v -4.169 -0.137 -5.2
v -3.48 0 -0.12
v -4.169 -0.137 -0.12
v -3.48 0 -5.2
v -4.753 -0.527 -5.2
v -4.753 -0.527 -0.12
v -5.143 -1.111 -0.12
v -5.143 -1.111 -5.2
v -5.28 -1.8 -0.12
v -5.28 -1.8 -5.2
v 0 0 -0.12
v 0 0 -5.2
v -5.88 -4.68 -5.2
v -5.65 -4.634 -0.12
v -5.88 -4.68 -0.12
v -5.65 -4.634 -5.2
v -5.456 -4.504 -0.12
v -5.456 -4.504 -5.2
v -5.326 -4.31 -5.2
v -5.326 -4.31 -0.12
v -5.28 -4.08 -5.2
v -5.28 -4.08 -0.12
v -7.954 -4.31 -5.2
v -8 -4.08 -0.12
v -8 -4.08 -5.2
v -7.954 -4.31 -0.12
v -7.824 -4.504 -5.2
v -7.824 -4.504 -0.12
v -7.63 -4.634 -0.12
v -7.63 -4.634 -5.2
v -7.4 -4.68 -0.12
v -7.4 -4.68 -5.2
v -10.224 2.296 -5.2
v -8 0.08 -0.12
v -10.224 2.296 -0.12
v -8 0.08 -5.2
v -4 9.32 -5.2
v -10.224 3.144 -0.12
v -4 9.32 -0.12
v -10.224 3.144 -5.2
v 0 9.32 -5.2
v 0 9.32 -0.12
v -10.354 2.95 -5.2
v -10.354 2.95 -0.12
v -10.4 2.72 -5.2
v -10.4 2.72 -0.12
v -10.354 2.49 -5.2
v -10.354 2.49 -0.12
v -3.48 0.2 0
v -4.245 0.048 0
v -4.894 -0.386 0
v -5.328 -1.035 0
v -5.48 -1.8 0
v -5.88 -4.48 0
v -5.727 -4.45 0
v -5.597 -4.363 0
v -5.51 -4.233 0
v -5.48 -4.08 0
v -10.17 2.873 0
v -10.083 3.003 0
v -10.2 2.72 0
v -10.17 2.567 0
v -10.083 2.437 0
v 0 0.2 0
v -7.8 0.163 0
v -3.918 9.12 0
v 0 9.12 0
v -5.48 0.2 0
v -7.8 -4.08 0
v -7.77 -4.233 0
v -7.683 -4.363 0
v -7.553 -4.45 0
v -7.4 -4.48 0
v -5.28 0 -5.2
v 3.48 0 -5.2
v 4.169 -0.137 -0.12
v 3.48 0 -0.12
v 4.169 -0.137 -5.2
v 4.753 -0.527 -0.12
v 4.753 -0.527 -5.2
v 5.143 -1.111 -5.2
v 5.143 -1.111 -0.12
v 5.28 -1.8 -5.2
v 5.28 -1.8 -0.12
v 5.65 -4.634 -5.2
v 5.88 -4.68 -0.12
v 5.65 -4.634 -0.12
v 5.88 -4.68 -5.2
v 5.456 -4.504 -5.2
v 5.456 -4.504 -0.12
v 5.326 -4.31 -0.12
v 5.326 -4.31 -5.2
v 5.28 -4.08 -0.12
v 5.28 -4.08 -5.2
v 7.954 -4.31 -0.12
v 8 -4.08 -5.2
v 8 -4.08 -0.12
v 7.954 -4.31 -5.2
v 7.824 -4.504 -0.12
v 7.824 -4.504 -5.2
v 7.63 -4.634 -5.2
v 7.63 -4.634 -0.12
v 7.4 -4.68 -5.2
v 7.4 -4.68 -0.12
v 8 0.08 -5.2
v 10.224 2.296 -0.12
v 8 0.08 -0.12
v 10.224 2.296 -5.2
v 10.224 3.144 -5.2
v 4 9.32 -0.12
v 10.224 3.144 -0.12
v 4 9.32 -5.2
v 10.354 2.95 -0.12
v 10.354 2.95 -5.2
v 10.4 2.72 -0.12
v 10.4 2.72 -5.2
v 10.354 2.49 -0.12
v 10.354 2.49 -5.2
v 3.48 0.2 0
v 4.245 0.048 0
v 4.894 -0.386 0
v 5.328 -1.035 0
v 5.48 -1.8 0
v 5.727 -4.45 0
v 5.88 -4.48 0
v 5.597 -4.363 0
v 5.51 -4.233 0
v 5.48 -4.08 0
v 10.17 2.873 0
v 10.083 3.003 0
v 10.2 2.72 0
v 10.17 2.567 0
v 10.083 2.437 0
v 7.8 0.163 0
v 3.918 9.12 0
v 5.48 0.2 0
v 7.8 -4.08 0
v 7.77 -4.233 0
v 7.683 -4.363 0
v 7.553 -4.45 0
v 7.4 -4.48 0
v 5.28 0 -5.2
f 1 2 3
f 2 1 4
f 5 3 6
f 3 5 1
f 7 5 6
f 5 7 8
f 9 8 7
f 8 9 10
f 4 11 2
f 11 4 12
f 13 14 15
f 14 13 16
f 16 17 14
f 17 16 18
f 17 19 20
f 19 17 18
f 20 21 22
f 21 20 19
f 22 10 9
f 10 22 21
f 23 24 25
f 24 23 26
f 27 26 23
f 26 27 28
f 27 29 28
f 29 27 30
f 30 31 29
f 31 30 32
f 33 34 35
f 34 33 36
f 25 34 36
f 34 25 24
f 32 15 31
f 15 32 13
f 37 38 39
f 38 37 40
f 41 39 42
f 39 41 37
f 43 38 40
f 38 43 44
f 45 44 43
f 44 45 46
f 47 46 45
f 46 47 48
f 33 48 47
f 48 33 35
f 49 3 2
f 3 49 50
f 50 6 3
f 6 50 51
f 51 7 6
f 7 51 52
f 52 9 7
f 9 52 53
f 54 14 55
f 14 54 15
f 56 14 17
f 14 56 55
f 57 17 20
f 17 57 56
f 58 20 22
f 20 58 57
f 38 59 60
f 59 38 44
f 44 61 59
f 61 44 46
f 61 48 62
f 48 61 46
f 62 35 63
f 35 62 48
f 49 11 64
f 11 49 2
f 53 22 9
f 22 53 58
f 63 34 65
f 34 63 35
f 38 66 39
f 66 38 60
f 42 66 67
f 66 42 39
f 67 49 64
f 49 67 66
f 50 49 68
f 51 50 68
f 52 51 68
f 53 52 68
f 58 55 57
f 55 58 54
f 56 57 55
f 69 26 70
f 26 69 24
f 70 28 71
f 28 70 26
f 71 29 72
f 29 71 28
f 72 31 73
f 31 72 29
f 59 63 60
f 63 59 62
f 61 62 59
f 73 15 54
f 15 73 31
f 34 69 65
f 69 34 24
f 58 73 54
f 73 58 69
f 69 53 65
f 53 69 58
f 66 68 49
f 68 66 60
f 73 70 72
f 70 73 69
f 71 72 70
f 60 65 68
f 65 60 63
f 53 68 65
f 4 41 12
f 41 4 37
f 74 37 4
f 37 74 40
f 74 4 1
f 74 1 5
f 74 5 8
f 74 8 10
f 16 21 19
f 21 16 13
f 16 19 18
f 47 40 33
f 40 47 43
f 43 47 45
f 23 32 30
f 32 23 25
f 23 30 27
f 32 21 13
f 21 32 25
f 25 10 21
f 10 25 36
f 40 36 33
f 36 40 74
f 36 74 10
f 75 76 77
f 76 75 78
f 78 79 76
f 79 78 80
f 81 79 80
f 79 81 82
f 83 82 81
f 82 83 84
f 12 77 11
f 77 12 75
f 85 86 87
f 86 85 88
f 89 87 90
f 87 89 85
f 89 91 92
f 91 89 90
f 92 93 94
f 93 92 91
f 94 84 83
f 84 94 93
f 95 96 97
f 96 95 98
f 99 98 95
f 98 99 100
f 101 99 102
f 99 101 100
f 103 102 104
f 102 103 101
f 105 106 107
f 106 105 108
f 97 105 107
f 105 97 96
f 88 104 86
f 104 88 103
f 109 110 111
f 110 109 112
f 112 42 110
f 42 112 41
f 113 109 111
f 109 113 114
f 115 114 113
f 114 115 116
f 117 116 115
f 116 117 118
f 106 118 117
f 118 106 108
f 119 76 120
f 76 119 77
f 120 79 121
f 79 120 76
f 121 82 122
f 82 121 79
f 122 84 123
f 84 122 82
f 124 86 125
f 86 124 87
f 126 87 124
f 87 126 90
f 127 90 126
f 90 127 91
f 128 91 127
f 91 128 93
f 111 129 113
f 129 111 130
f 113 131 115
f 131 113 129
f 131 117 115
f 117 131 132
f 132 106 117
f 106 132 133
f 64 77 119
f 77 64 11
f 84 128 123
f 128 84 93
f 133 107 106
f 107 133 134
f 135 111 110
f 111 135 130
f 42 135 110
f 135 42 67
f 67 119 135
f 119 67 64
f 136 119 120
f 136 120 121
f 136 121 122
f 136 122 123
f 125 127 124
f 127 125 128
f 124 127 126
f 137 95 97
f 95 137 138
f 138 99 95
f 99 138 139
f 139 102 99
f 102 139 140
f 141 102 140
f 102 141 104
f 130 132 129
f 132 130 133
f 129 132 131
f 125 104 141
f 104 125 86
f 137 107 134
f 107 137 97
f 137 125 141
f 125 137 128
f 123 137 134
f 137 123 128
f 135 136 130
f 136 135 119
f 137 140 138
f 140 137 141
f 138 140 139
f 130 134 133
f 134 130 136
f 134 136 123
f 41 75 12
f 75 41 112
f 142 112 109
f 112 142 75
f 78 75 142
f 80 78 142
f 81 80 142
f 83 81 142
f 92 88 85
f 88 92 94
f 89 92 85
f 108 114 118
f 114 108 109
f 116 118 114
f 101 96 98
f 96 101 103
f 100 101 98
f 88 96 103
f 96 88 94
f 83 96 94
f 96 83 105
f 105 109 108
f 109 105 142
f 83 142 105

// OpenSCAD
// file: ../p/1-4cyli.scad
use <../lib.scad>
function ldraw_lib__1_4cyli() = [
// 0 Cylinder 0.25
// 0 Name: 1-4cyli.dat
// 0 Author: James Jessiman
// 0 !LDRAW_ORG Primitive UPDATE 2012-01
// 0 !LICENSE Licensed under CC BY 2.0 and CC BY 4.0 : see CAreadme.txt
// 
// 0 BFC CERTIFY CCW
  [0,"BFC","CERTIFY"],
  [0,"BFC","CCW"],
// 
// 0 !HISTORY 2002-03-23 [sbliss] Added BFC statement.
// 0 !HISTORY 2002-04-25 [PTadmin] Official Update 2002-02
// 0 !HISTORY 2007-06-22 [PTadmin] Header formatted for Contributor Agreement
// 0 !HISTORY 2008-07-01 [PTadmin] Official Update 2008-01
// 0 !HISTORY 2012-02-16 [Philo] Changed to CCW
// 0 !HISTORY 2012-03-30 [PTadmin] Official Update 2012-01
// 
// 
// 4 16 1 1 0 0.9239 1 0.3827 0.9239 0 0.3827 1 0 0
  [4,16,1,1,0,0.9239,1,0.3827,0.9239,0,0.3827,1,0,0],
// 5 24 1 0 0 1 1 0 0.9239 0 0.3827 1 0 -1
  [5,24,1,0,0,1,1,0,0.9239,0,0.3827,1,0,-1],
// 4 16 0.9239 1 0.3827 0.7071 1 0.7071 0.7071 0 0.7071 0.9239 0 0.3827
  [4,16,0.9239,1,0.3827,0.7071,1,0.7071,0.7071,0,0.7071,0.9239,0,0.3827],
// 5 24 0.9239 0 0.3827 0.9239 1 0.3827 0.7071 0 0.7071 1 0 0
  [5,24,0.9239,0,0.3827,0.9239,1,0.3827,0.7071,0,0.7071,1,0,0],
// 4 16 0.7071 1 0.7071 0.3827 1 0.9239 0.3827 0 0.9239 0.7071 0 0.7071
  [4,16,0.7071,1,0.7071,0.3827,1,0.9239,0.3827,0,0.9239,0.7071,0,0.7071],
// 5 24 0.7071 0 0.7071 0.7071 1 0.7071 0.3827 0 0.9239 0.9239 0 0.3827
  [5,24,0.7071,0,0.7071,0.7071,1,0.7071,0.3827,0,0.9239,0.9239,0,0.3827],
// 4 16 0.3827 1 0.9239 0 1 1 0 0 1 0.3827 0 0.9239
  [4,16,0.3827,1,0.9239,0,1,1,0,0,1,0.3827,0,0.9239],
// 5 24 0.3827 0 0.9239 0.3827 1 0.9239 0 0 1 0.7071 0 0.7071
  [5,24,0.3827,0,0.9239,0.3827,1,0.9239,0,0,1,0.7071,0,0.7071],
// 5 24 0 0 1 0 1 1 0.3827 0 0.9239 -1 0 1
  [5,24,0,0,1,0,1,1,0.3827,0,0.9239,-1,0,1],
];
makepoly(ldraw_lib__1_4cyli(), line=0.2);
// file: ../p/rect3.scad
use <../lib.scad>
function ldraw_lib__rect3() = [
// 0 Rectangle with 3 Edges
// 0 Name: rect3.dat
// 0 Author: Mark Kennedy [mkennedy]
// 0 !LDRAW_ORG Primitive UPDATE 2010-01
// 0 !LICENSE Licensed under CC BY 2.0 and CC BY 4.0 : see CAreadme.txt
// 
// 0 BFC CERTIFY CCW
  [0,"BFC","CERTIFY"],
  [0,"BFC","CCW"],
// 
// 0 !HISTORY 2003-08-01 [PTadmin] Official Update 2003-02
// 0 !HISTORY 2007-06-24 [PTadmin] Header formatted for Contributor Agreement
// 0 !HISTORY 2008-07-01 [PTadmin] Official Update 2008-01
// 0 !HISTORY 2010-01-17 [mikeheide] Change winding to CCW
// 0 !HISTORY 2010-04-05 [PTadmin] Official Update 2010-01
// 
// 
// 2 24 1 0 1 -1 0 1
  [2,24,1,0,1,-1,0,1],
// 2 24 1 0 1 1 0 -1
  [2,24,1,0,1,1,0,-1],
// 2 24 -1 0 1 -1 0 -1
  [2,24,-1,0,1,-1,0,-1],
// 4 16 -1 0 1 -1 0 -1 1 0 -1 1 0 1
  [4,16,-1,0,1,-1,0,-1,1,0,-1,1,0,1],
// 0 //
];
makepoly(ldraw_lib__rect3(), line=0.2);
// file: ../p/rect2p.scad
use <../lib.scad>
function ldraw_lib__rect2p() = [
// 0 Rectangle with 2 Parallel Edges
// 0 Name: rect2p.dat
// 0 Author: Donald Sutter [technog]
// 0 !LDRAW_ORG Primitive UPDATE 2010-01
// 0 !LICENSE Licensed under CC BY 2.0 and CC BY 4.0 : see CAreadme.txt
// 
// 0 BFC CERTIFY CCW
  [0,"BFC","CERTIFY"],
  [0,"BFC","CCW"],
// 
// 0 !HISTORY 2003-08-01 [PTadmin] Official Update 2003-02
// 0 !HISTORY 2007-06-24 [PTadmin] Header formatted for Contributor Agreement
// 0 !HISTORY 2008-07-01 [PTadmin] Official Update 2008-01
// 0 !HISTORY 2010-01-17 [mikeheide] changed winding to CCW
// 0 !HISTORY 2010-04-05 [PTadmin] Official Update 2010-01
// 
// 
// 2 24 1 0 1 -1 0 1
  [2,24,1,0,1,-1,0,1],
// 2 24 -1 0 -1 1 0 -1
  [2,24,-1,0,-1,1,0,-1],
// 4 16 -1 0 1 -1 0 -1 1 0 -1 1 0 1
  [4,16,-1,0,1,-1,0,-1,1,0,-1,1,0,1],
// 0
];
makepoly(ldraw_lib__rect2p(), line=0.2);
// file: ../p/rect1.scad
use <../lib.scad>
function ldraw_lib__rect1() = [
// 0 Rectangle with 1 Edge
// 0 Name: rect1.dat
// 0 Author: Chris Dee [cwdee]
// 0 !LDRAW_ORG Primitive UPDATE 2010-01
// 0 !LICENSE Licensed under CC BY 2.0 and CC BY 4.0 : see CAreadme.txt
// 
// 0 BFC CERTIFY CCW
  [0,"BFC","CERTIFY"],
  [0,"BFC","CCW"],
// 
// 0 !HISTORY 2003-12-19 [PTadmin] Official Update 2003-03
// 0 !HISTORY 2007-06-24 [PTadmin] Header formatted for Contributor Agreement
// 0 !HISTORY 2008-07-01 [PTadmin] Official Update 2008-01
// 0 !HISTORY 2010-01-17 [mikeheide] changed winding to CCW
// 0 !HISTORY 2010-04-05 [PTadmin] Official Update 2010-01
// 
// 
// 2 24 1 0 -1 1 0 1
  [2,24,1,0,-1,1,0,1],
// 4 16 -1 0 1 -1 0 -1 1 0 -1 1 0 1
  [4,16,-1,0,1,-1,0,-1,1,0,-1,1,0,1],
// 0
];
makepoly(ldraw_lib__rect1(), line=0.2);
// file: ../p/1-4ndis.scad
use <../lib.scad>
function ldraw_lib__1_4ndis() = [
// 0 Disc Negative 0.25
// 0 Name: 1-4ndis.dat
// 0 Author: James Jessiman
// 0 !LDRAW_ORG Primitive UPDATE 2012-01
// 0 !LICENSE Licensed under CC BY 2.0 and CC BY 4.0 : see CAreadme.txt
// 
// 0 BFC CERTIFY CCW
  [0,"BFC","CERTIFY"],
  [0,"BFC","CCW"],
// 
// 0 !HISTORY 2002-03-23 [sbliss] Added BFC Statement
// 0 !HISTORY 2002-04-25 [PTadmin] Official Update 2002-02
// 0 !HISTORY 2007-06-22 [PTadmin] Header formatted for Contributor Agreement
// 0 !HISTORY 2008-07-01 [PTadmin] Official Update 2008-01
// 0 !HISTORY 2012-02-16 [Philo] Changed to CCW
// 0 !HISTORY 2012-03-30 [PTadmin] Official Update 2012-01
// 
// 
// 3 16 0.9239 0 0.3827 1 0 0 1 0 1
  [3,16,0.9239,0,0.3827,1,0,0,1,0,1],
// 3 16 0.7071 0 0.7071 0.9239 0 0.3827 1 0 1
  [3,16,0.7071,0,0.7071,0.9239,0,0.3827,1,0,1],
// 3 16 0.3827 0 0.9239 0.7071 0 0.7071 1 0 1
  [3,16,0.3827,0,0.9239,0.7071,0,0.7071,1,0,1],
// 3 16 0 0 1 0.3827 0 0.9239 1 0 1
  [3,16,0,0,1,0.3827,0,0.9239,1,0,1],
];
makepoly(ldraw_lib__1_4ndis(), line=0.2);
// file: ../p/1-4edge.scad
use <../lib.scad>
function ldraw_lib__1_4edge() = [
// 0 Circle 0.25
// 0 Name: 1-4edge.dat
// 0 Author: James Jessiman
// 0 !LDRAW_ORG Primitive UPDATE 2017-01
// 0 !LICENSE Licensed under CC BY 2.0 and CC BY 4.0 : see CAreadme.txt
// 
// 0 BFC CERTIFY CCW
  [0,"BFC","CERTIFY"],
  [0,"BFC","CCW"],
// 
// 0 !HISTORY 2007-06-22 [PTadmin] Header formatted for Contributor Agreement
// 0 !HISTORY 2008-07-01 [PTadmin] Official Update 2008-01
// 0 !HISTORY 2017-01-15 [Steffen] BFCed
// 0 !HISTORY 2017-12-30 [PTadmin] Official Update 2017-01
// 
// 
// 2 24 1 0 0 0.9239 0 0.3827
  [2,24,1,0,0,0.9239,0,0.3827],
// 2 24 0.9239 0 0.3827 0.7071 0 0.7071
  [2,24,0.9239,0,0.3827,0.7071,0,0.7071],
// 2 24 0.7071 0 0.7071 0.3827 0 0.9239
  [2,24,0.7071,0,0.7071,0.3827,0,0.9239],
// 2 24 0.3827 0 0.9239 0 0 1
  [2,24,0.3827,0,0.9239,0,0,1],
];
makepoly(ldraw_lib__1_4edge(), line=0.2);
// file: ../p/1-4cylo.scad
use <../lib.scad>
use <1-4cyli.scad>
use <1-4edge.scad>
function ldraw_lib__1_4cylo() = [
// 0 Cylinder Open 0.25
// 0 Name: 1-4cylo.dat
// 0 Author: Max Martin Richter [MMR1988]
// 0 !LDRAW_ORG Primitive UPDATE 2010-03
// 0 !LICENSE Licensed under CC BY 2.0 and CC BY 4.0 : see CAreadme.txt
// 
// 0 BFC CERTIFY CCW
  [0,"BFC","CERTIFY"],
  [0,"BFC","CCW"],
// 
// 0 !HISTORY 2010-12-31 [PTadmin] Official Update 2010-03
// 
// 
// 1 16 0 0 0 1 0 0 0 1 0 0 0 1 1-4edge.dat
  [1,16,0,0,0,1,0,0,0,1,0,0,0,1, ldraw_lib__1_4edge()],
// 1 16 0 1 0 1 0 0 0 1 0 0 0 1 1-4edge.dat
  [1,16,0,1,0,1,0,0,0,1,0,0,0,1, ldraw_lib__1_4edge()],
// 1 16 0 0 0 1 0 0 0 1 0 0 0 1 1-4cyli.dat
  [1,16,0,0,0,1,0,0,0,1,0,0,0,1, ldraw_lib__1_4cyli()],
];
makepoly(ldraw_lib__1_4cylo(), line=0.2);
// file: ../p/1-4con9.scad
use <../lib.scad>
function ldraw_lib__1_4con9() = [
// 0 Cone  9 x 0.25
// 0 Name: 1-4con9.dat
// 0 Author: [PTadmin]
// 0 !LDRAW_ORG Primitive UPDATE 2012-01
// 0 !LICENSE Licensed under CC BY 2.0 and CC BY 4.0 : see CAreadme.txt
// 
// 0 BFC CERTIFY CCW
  [0,"BFC","CERTIFY"],
  [0,"BFC","CCW"],
// 
// 0 !HISTORY 2002-07-18 [fwcain] Fixed title
// 0 !HISTORY 2003-01-01 [OrionP] Made BFC compliant
// 0 !HISTORY 2003-01-12 [pneaster] Fixed decimals
// 0 !HISTORY 2010-07-05 [PTadmin] Official Update 2010-02
// 0 !HISTORY 2012-02-16 [Philo] Recreated CCW
// 0 !HISTORY 2012-03-30 [PTadmin] Official Update 2012-01
// 
// 
// 4 16 9 1 0 8.3151 1 3.4443 9.239 0 3.827 10 0 0
  [4,16,9,1,0,8.3151,1,3.4443,9.239,0,3.827,10,0,0],
// 4 16 8.3151 1 3.4443 6.3639 1 6.3639 7.071 0 7.071 9.239 0 3.827
  [4,16,8.3151,1,3.4443,6.3639,1,6.3639,7.071,0,7.071,9.239,0,3.827],
// 4 16 6.3639 1 6.3639 3.4443 1 8.3151 3.827 0 9.239 7.071 0 7.071
  [4,16,6.3639,1,6.3639,3.4443,1,8.3151,3.827,0,9.239,7.071,0,7.071],
// 4 16 3.4443 1 8.3151 0 1 9 0 0 10 3.827 0 9.239
  [4,16,3.4443,1,8.3151,0,1,9,0,0,10,3.827,0,9.239],
// 0 // conditional lines
// 5 24 9 1 0 10 0 0 9 1 -3.7279 8.3149 1 3.4442
  [5,24,9,1,0,10,0,0,9,1,-3.7279,8.3149,1,3.4442],
// 5 24 8.3151 1 3.4443 9.239 0 3.827 9 1 0 6.364 1 6.364
  [5,24,8.3151,1,3.4443,9.239,0,3.827,9,1,0,6.364,1,6.364],
// 5 24 6.3639 1 6.3639 7.071 0 7.071 8.3149 1 3.4442 3.4442 1 8.3149
  [5,24,6.3639,1,6.3639,7.071,0,7.071,8.3149,1,3.4442,3.4442,1,8.3149],
// 5 24 3.4443 1 8.3151 3.827 0 9.239 6.364 1 6.364 0 1 9
  [5,24,3.4443,1,8.3151,3.827,0,9.239,6.364,1,6.364,0,1,9],
// 5 24 0 1 9 0 0 10 3.4442 1 8.3149 -3.7279 1 9
  [5,24,0,1,9,0,0,10,3.4442,1,8.3149,-3.7279,1,9],
// 0 // Build by Primitive Generator 2
];
makepoly(ldraw_lib__1_4con9(), line=0.2);
// file: ../p/1-4con2.scad
use <../lib.scad>
function ldraw_lib__1_4con2() = [
// 0 Cone  2 x 0.25
// 0 Name: 1-4con2.dat
// 0 Author: Steve Bliss [sbliss]
// 0 !LDRAW_ORG Primitive UPDATE 2012-01
// 0 !LICENSE Licensed under CC BY 2.0 and CC BY 4.0 : see CAreadme.txt
// 
// 0 BFC CERTIFY CCW
  [0,"BFC","CERTIFY"],
  [0,"BFC","CCW"],
// 
// 0 !HISTORY 1999-07-05 [PTadmin] Official Update 1999-05
// 0 !HISTORY 2002-12-11 [cwdee] Standardised title and made BFC compliant
// 0 !HISTORY 2003-06-28 [pneaster] Added missing conditional line
// 0 !HISTORY 2003-12-19 [PTadmin] Official Update 2003-03
// 0 !HISTORY 2007-06-22 [PTadmin] Header formatted for Contributor Agreement
// 0 !HISTORY 2008-07-01 [PTadmin] Official Update 2008-01
// 0 !HISTORY 2012-02-16 [Philo] Recreated CCW
// 0 !HISTORY 2012-03-30 [PTadmin] Official Update 2012-01
// 
// 
// 4 16 2 1 0 1.8478 1 0.7654 2.7717 0 1.1481 3 0 0
  [4,16,2,1,0,1.8478,1,0.7654,2.7717,0,1.1481,3,0,0],
// 4 16 1.8478 1 0.7654 1.4142 1 1.4142 2.1213 0 2.1213 2.7717 0 1.1481
  [4,16,1.8478,1,0.7654,1.4142,1,1.4142,2.1213,0,2.1213,2.7717,0,1.1481],
// 4 16 1.4142 1 1.4142 0.7654 1 1.8478 1.1481 0 2.7717 2.1213 0 2.1213
  [4,16,1.4142,1,1.4142,0.7654,1,1.8478,1.1481,0,2.7717,2.1213,0,2.1213],
// 4 16 0.7654 1 1.8478 0 1 2 0 0 3 1.1481 0 2.7717
  [4,16,0.7654,1,1.8478,0,1,2,0,0,3,1.1481,0,2.7717],
// 0 // conditional lines
// 5 24 2 1 0 3 0 0 2 1 -0.8284 1.8478 1 0.7654
  [5,24,2,1,0,3,0,0,2,1,-0.8284,1.8478,1,0.7654],
// 5 24 1.8478 1 0.7654 2.7717 0 1.1481 2 1 0 1.4142 1 1.4142
  [5,24,1.8478,1,0.7654,2.7717,0,1.1481,2,1,0,1.4142,1,1.4142],
// 5 24 1.4142 1 1.4142 2.1213 0 2.1213 1.8478 1 0.7654 0.7654 1 1.8478
  [5,24,1.4142,1,1.4142,2.1213,0,2.1213,1.8478,1,0.7654,0.7654,1,1.8478],
// 5 24 0.7654 1 1.8478 1.1481 0 2.7717 1.4142 1 1.4142 0 1 2
  [5,24,0.7654,1,1.8478,1.1481,0,2.7717,1.4142,1,1.4142,0,1,2],
// 5 24 0 1 2 0 0 3 0.7654 1 1.8478 -0.8284 1 2
  [5,24,0,1,2,0,0,3,0.7654,1,1.8478,-0.8284,1,2],
// 0 // Build by Primitive Generator 2
];
makepoly(ldraw_lib__1_4con2(), line=0.2);
// file: ../p/1-4chrd.scad
use <../lib.scad>
function ldraw_lib__1_4chrd() = [
// 0 Chord 0.25
// 0 Name: 1-4chrd.dat
// 0 Author: Tony Hafner [hafhead]
// 0 !LDRAW_ORG Primitive UPDATE 2012-02
// 0 !LICENSE Licensed under CC BY 2.0 and CC BY 4.0 : see CAreadme.txt
// 
// 0 BFC CERTIFY CCW
  [0,"BFC","CERTIFY"],
  [0,"BFC","CCW"],
// 
// 0 !HISTORY 2004-04-22 [PTadmin] Official Update 2004-02
// 0 !HISTORY 2007-10-09 [PTadmin] Header formatted for Contributor Agreement
// 0 !HISTORY 2008-07-01 [PTadmin] Official Update 2008-01
// 0 !HISTORY 2012-08-02 [MMR1988] Re-creation with PrimGen2 and Rectifier
// 0 !HISTORY 2012-08-09 [PTadmin] Official Update 2012-02
// 
// 
// 4 16 0.9239 0 0.3827 0.3827 0 0.9239 0 0 1 1 0 0
  [4,16,0.9239,0,0.3827,0.3827,0,0.9239,0,0,1,1,0,0],
// 3 16 0.7071 0 0.7071 0.3827 0 0.9239 0.9239 0 0.3827
  [3,16,0.7071,0,0.7071,0.3827,0,0.9239,0.9239,0,0.3827],
];
makepoly(ldraw_lib__1_4chrd(), line=0.2);
// main file
use <../lib.scad>
use <../p/1-4chrd.scad>
use <../p/1-4con2.scad>
use <../p/1-4con9.scad>
use <../p/1-4cylo.scad>
use <../p/1-4edge.scad>
use <../p/1-4ndis.scad>
use <../p/rect1.scad>
use <../p/rect2p.scad>
use <../p/rect3.scad>
function ldraw_lib__99147() = [
// 0 ~Electric Mindstorms EV3 Arrow Shaped Button
// 0 Name: 99147.dat
// 0 Author: Philippe Hurbain [Philo]
// 0 !LDRAW_ORG Part UPDATE 2013-02
// 0 !LICENSE Licensed under CC BY 2.0 and CC BY 4.0 : see CAreadme.txt
// 
// 0 BFC CERTIFY CCW
  [0,"BFC","CERTIFY"],
  [0,"BFC","CCW"],
// 
// 0 !HISTORY 2012-05-20 {LEGO MINDSTORMS Team} Original part shape
// 0 !HISTORY 2012-06-09 [Philo] Complete rebuild for LDraw Parts Tracker
// 0 !HISTORY 2013-12-23 [PTadmin] Official Update 2013-02
// 
// 
// 0 BFC INVERTNEXT
  [0,"BFC","INVERTNEXT"],
// 1 16 -8.7 0.3 -4.5 0 0 -4.5 0 12.7 0 4.5 0 0 1-4cylo.dat
  [1,16,-8.7,0.3,-4.5,0,0,-4.5,0,12.7,0,4.5,0,0, ldraw_lib__1_4cylo()],
// 1 16 -4.35 6.65 0 -4.35 0 0 0 0 6.35 0 1 0 rect2p.dat
  [1,16,-4.35,6.65,0,-4.35,0,0,0,0,6.35,0,1,0, ldraw_lib__rect2p()],
// 1 16 -14.7 0.3 -10.2 0 0 1.5 0 12.7 0 -1.5 0 0 1-4cylo.dat
  [1,16,-14.7,0.3,-10.2,0,0,1.5,0,12.7,0,-1.5,0,0, ldraw_lib__1_4cylo()],
// 1 16 -13.2 6.65 -7.35 0 -1.00135 0 0 0 -6.35 2.85 0 0 rect2p.dat
  [1,16,-13.2,6.65,-7.35,0,-1.00135,0,0,0,-6.35,2.85,0,0, ldraw_lib__rect2p()],
// 1 16 -18.5 0.3 -10.2 -1.5 0 0 0 12.7 0 0 0 -1.5 1-4cylo.dat
  [1,16,-18.5,0.3,-10.2,-1.5,0,0,0,12.7,0,0,0,-1.5, ldraw_lib__1_4cylo()],
// 1 16 -22.78 6.65 2.97 0 -1.00015 2.78035 -6.35 0 0 0 1 -2.76965 rect3.dat
  [1,16,-22.78,6.65,2.97,0,-1.00015,2.78035,-6.35,0,0,0,1,-2.76965, ldraw_lib__rect3()],
// 1 16 -20 6.65 -5 0 1 0 0 0 6.35 -5.2 0 0 rect2p.dat
  [1,16,-20,6.65,-5,0,1,0,0,0,6.35,-5.2,0,0, ldraw_lib__rect2p()],
// 1 16 -16.6 6.65 -11.7 1.9 0 0 0 0 6.35 0 1 0 rect2p.dat
  [1,16,-16.6,6.65,-11.7,1.9,0,0,0,0,6.35,0,1,0, ldraw_lib__rect2p()],
// 1 16 -17.78 6.65 15.58 0 -0.70433 7.78035 6.35 0 0 0 -1 7.71965 rect3.dat
  [1,16,-17.78,6.65,15.58,0,-0.70433,7.78035,6.35,0,0,0,-1,7.71965, ldraw_lib__rect3()],
// 1 16 -5 6.65 23.3 5 0 0 0 0 -6.35 0 -1 0 rect2p.dat
  [1,16,-5,6.65,23.3,5,0,0,0,0,-6.35,0,-1,0, ldraw_lib__rect2p()],
// 1 16 -24.5 0.3 6.8 -1.06066 0 -1.06066 0 12.7 0 1.06066 0 -1.06066 1-4cylo.dat
  [1,16,-24.5,0.3,6.8,-1.06066,0,-1.06066,0,12.7,0,1.06066,0,-1.06066, ldraw_lib__1_4cylo()],
// 5 24 -19.5 0 0.408 -20 0.3 0.2 -20 0.3 -10.2 -25.207 0 6.093
  [5,24,-19.5,0,0.408,-20,0.3,0.2,-20,0.3,-10.2,-25.207,0,6.093],
// 0 BFC INVERTNEXT
  [0,"BFC","INVERTNEXT"],
// 1 16 -8.7 0 -4.5 0 0 -0.5 0 0.3 0 0.5 0 0 1-4con9.dat
  [1,16,-8.7,0,-4.5,0,0,-0.5,0,0.3,0,0.5,0,0, ldraw_lib__1_4con9()],
// 1 16 -8.7 0 -4.5 0 0 -5 0 0.3 0 5 0 0 1-4edge.dat
  [1,16,-8.7,0,-4.5,0,0,-5,0,0.3,0,5,0,0, ldraw_lib__1_4edge()],
// 1 16 -14.7 0.3 -10.2 0 0 0.5 0 -0.3 0 -0.5 0 0 1-4con2.dat
  [1,16,-14.7,0.3,-10.2,0,0,0.5,0,-0.3,0,-0.5,0,0, ldraw_lib__1_4con2()],
// 1 16 -14.7 0 -10.2 0 0 1 0 0.3 0 -1 0 0 1-4edge.dat
  [1,16,-14.7,0,-10.2,0,0,1,0,0.3,0,-1,0,0, ldraw_lib__1_4edge()],
// 1 16 -24.5 0 6.8 -0.70711 0 -0.70711 0 0.3 0 0.70711 0 -0.70711 1-4edge.dat
  [1,16,-24.5,0,6.8,-0.70711,0,-0.70711,0,0.3,0,0.70711,0,-0.70711, ldraw_lib__1_4edge()],
// 1 16 -24.5 0.3 6.8 -0.35355 0 -0.35355 0 -0.3 0 0.35355 0 -0.35355 1-4con2.dat
  [1,16,-24.5,0.3,6.8,-0.35355,0,-0.35355,0,-0.3,0,0.35355,0,-0.35355, ldraw_lib__1_4con2()],
// 1 16 -4.35 0.15 0.25 0 0 -4.35 -0.15 4.35 0 0.25 2.61 0 rect1.dat
  [1,16,-4.35,0.15,0.25,0,0,-4.35,-0.15,4.35,0,0.25,2.61,0, ldraw_lib__rect1()],
// 1 16 -13.45 0.15 -7.35 -0.25 -1.71 0 -0.15 2.85 0 0 0 -2.85 rect1.dat
  [1,16,-13.45,0.15,-7.35,-0.25,-1.71,0,-0.15,2.85,0,0,0,-2.85, ldraw_lib__rect1()],
// 4 16 -25.207 0 6.093 -25.561 0.3 5.739 -20 0.3 0.2 -19.5 0 0.408
  [4,16,-25.207,0,6.093,-25.561,0.3,5.739,-20,0.3,0.2,-19.5,0,0.408],
// 4 16 -9.794 0 22.8 -10 0.3 23.3 -25.56 0.3 7.86 -25.207 0 7.507
  [4,16,-9.794,0,22.8,-10,0.3,23.3,-25.56,0.3,7.86,-25.207,0,7.507],
// 4 16 0 0 22.8 0 0.3 23.3 -10 0.3 23.3 -9.794 0 22.8
  [4,16,0,0,22.8,0,0.3,23.3,-10,0.3,23.3,-9.794,0,22.8],
// 4 16 -9.794 0 22.8 -8.7 0 0.5 0 0 0.5 0 0 22.8
  [4,16,-9.794,0,22.8,-8.7,0,0.5,0,0,0.5,0,0,22.8],
// 2 24 0 0 22.8 -9.794 0 22.8
  [2,24,0,0,22.8,-9.794,0,22.8],
// 2 24 -9.794 0 22.8 -25.207 0 7.507
  [2,24,-9.794,0,22.8,-25.207,0,7.507],
// 2 24 -25.207 0 6.093 -19.5 0 0.408
  [2,24,-25.207,0,6.093,-19.5,0,0.408],
// 5 24 -9.794 0 22.8 -10 0.3 23.3 -25.56 0.3 7.86 0 0 22.8
  [5,24,-9.794,0,22.8,-10,0.3,23.3,-25.56,0.3,7.86,0,0,22.8],
// 1 16 -8.7 0 -4.5 0 0 -5 0 0.3 0 5 0 0 1-4ndis.dat
  [1,16,-8.7,0,-4.5,0,0,-5,0,0.3,0,5,0,0, ldraw_lib__1_4ndis()],
// 1 16 -14.7 0 -10.2 0 0 1 0 0.3 0 -1 0 0 1-4chrd.dat
  [1,16,-14.7,0,-10.2,0,0,1,0,0.3,0,-1,0,0, ldraw_lib__1_4chrd()],
// 1 16 -18.5 0 -10.2 -1 0 0 0 0.3 0 0 0 -1 1-4edge.dat
  [1,16,-18.5,0,-10.2,-1,0,0,0,0.3,0,0,0,-1, ldraw_lib__1_4edge()],
// 1 16 -18.5 0.3 -10.2 -0.5 0 0 0 -0.3 0 0 0 -0.5 1-4con2.dat
  [1,16,-18.5,0.3,-10.2,-0.5,0,0,0,-0.3,0,0,0,-0.5, ldraw_lib__1_4con2()],
// 1 16 -24.5 0 6.8 -0.70711 0 -0.70711 0 0.3 0 0.70711 0 -0.70711 1-4chrd.dat
  [1,16,-24.5,0,6.8,-0.70711,0,-0.70711,0,0.3,0,0.70711,0,-0.70711, ldraw_lib__1_4chrd()],
// 1 16 -16.6 0.15 -11.45 0 0 -1.9 -0.15 1.9 0 0.25 1.14 0 rect1.dat
  [1,16,-16.6,0.15,-11.45,0,0,-1.9,-0.15,1.9,0,0.25,1.14,0, ldraw_lib__rect1()],
// 4 16 -19.5 0 0.408 -20 0.3 0.2 -20 0.3 -10.2 -19.5 0 -10.2
  [4,16,-19.5,0,0.408,-20,0.3,0.2,-20,0.3,-10.2,-19.5,0,-10.2],
// 4 16 -14.7 0 -11.2 -13.7 0 -10.2 -19.5 0 -10.2 -18.5 0 -11.2
  [4,16,-14.7,0,-11.2,-13.7,0,-10.2,-19.5,0,-10.2,-18.5,0,-11.2],
// 4 16 -19.5 0 0.408 -19.5 0 -10.2 -13.7 0 -10.2 -13.7 0 -4.5
  [4,16,-19.5,0,0.408,-19.5,0,-10.2,-13.7,0,-10.2,-13.7,0,-4.5],
// 4 16 -25.207 0 7.507 -13.7 0 0.5 -8.7 0 0.5 -9.794 0 22.8
  [4,16,-25.207,0,7.507,-13.7,0,0.5,-8.7,0,0.5,-9.794,0,22.8],
// 2 24 -19.5 0 0.408 -19.5 0 -10.2
  [2,24,-19.5,0,0.408,-19.5,0,-10.2],
// 1 16 -18.5 0 -10.2 -1 0 0 0 0.3 0 0 0 -1 1-4chrd.dat
  [1,16,-18.5,0,-10.2,-1,0,0,0,0.3,0,0,0,-1, ldraw_lib__1_4chrd()],
// 4 16 -25.207 0 6.093 -19.5 0 0.408 -13.7 0 0.5 -25.207 0 7.507
  [4,16,-25.207,0,6.093,-19.5,0,0.408,-13.7,0,0.5,-25.207,0,7.507],
// 3 16 -13.7 0 -4.5 -13.7 0 0.5 -19.5 0 0.408
  [3,16,-13.7,0,-4.5,-13.7,0,0.5,-19.5,0,0.408],
// 4 16 0 13 23.3 0 13 0 -8.7 13 0 -10 13 23.3
  [4,16,0,13,23.3,0,13,0,-8.7,13,0,-10,13,23.3],
// 4 16 -10 13 23.3 -8.7 13 0 -13.2 13 0 -25.561 13 7.861
  [4,16,-10,13,23.3,-8.7,13,0,-13.2,13,0,-25.561,13,7.861],
// 1 16 -8.7 13 -4.5 0 0 -4.5 0 -0.3 0 4.5 0 0 1-4ndis.dat
  [1,16,-8.7,13,-4.5,0,0,-4.5,0,-0.3,0,4.5,0,0, ldraw_lib__1_4ndis()],
// 1 16 -14.7 13 -10.2 0 0 1.5 0 -0.3 0 -1.5 0 0 1-4chrd.dat
  [1,16,-14.7,13,-10.2,0,0,1.5,0,-0.3,0,-1.5,0,0, ldraw_lib__1_4chrd()],
// 1 16 -24.5 13 6.8 -1.06066 0 -1.06066 0 -0.3 0 1.06066 0 -1.06066 1-4chrd.dat
  [1,16,-24.5,13,6.8,-1.06066,0,-1.06066,0,-0.3,0,1.06066,0,-1.06066, ldraw_lib__1_4chrd()],
// 1 16 -18.5 13 -10.2 -1.5 0 0 0 -0.3 0 0 0 -1.5 1-4chrd.dat
  [1,16,-18.5,13,-10.2,-1.5,0,0,0,-0.3,0,0,0,-1.5, ldraw_lib__1_4chrd()],
// 4 16 -18.5 13 -11.7 -20 13 -10.2 -13.2 13 -10.2 -14.7 13 -11.7
  [4,16,-18.5,13,-11.7,-20,13,-10.2,-13.2,13,-10.2,-14.7,13,-11.7],
// 4 16 -13.2 13 -4.5 -13.2 13 -10.2 -20 13 -10.2 -20 13 0.2
  [4,16,-13.2,13,-4.5,-13.2,13,-10.2,-20,13,-10.2,-20,13,0.2],
// 4 16 -25.561 13 7.861 -13.2 13 0 -20 13 0.2 -25.561 13 5.739
  [4,16,-25.561,13,7.861,-13.2,13,0,-20,13,0.2,-25.561,13,5.739],
// 3 16 -20 13 0.2 -13.2 13 0 -13.2 13 -4.5
  [3,16,-20,13,0.2,-13.2,13,0,-13.2,13,-4.5],
// 0 BFC INVERTNEXT
  [0,"BFC","INVERTNEXT"],
// 1 16 8.7 0.3 -4.5 0 0 4.5 0 12.7 0 4.5 0 0 1-4cylo.dat
  [1,16,8.7,0.3,-4.5,0,0,4.5,0,12.7,0,4.5,0,0, ldraw_lib__1_4cylo()],
// 1 16 4.35 6.65 0 4.35 0 0 0 0 6.35 0 1 0 rect2p.dat
  [1,16,4.35,6.65,0,4.35,0,0,0,0,6.35,0,1,0, ldraw_lib__rect2p()],
// 1 16 14.7 0.3 -10.2 0 0 -1.5 0 12.7 0 -1.5 0 0 1-4cylo.dat
  [1,16,14.7,0.3,-10.2,0,0,-1.5,0,12.7,0,-1.5,0,0, ldraw_lib__1_4cylo()],
// 1 16 13.2 6.65 -7.35 0 1.00135 0 0 0 -6.35 2.85 0 0 rect2p.dat
  [1,16,13.2,6.65,-7.35,0,1.00135,0,0,0,-6.35,2.85,0,0, ldraw_lib__rect2p()],
// 1 16 18.5 0.3 -10.2 1.5 0 0 0 12.7 0 0 0 -1.5 1-4cylo.dat
  [1,16,18.5,0.3,-10.2,1.5,0,0,0,12.7,0,0,0,-1.5, ldraw_lib__1_4cylo()],
// 1 16 22.78 6.65 2.97 0 1.00015 -2.78035 -6.35 0 0 0 1 -2.76965 rect3.dat
  [1,16,22.78,6.65,2.97,0,1.00015,-2.78035,-6.35,0,0,0,1,-2.76965, ldraw_lib__rect3()],
// 1 16 20 6.65 -5 0 -1 0 0 0 6.35 -5.2 0 0 rect2p.dat
  [1,16,20,6.65,-5,0,-1,0,0,0,6.35,-5.2,0,0, ldraw_lib__rect2p()],
// 1 16 16.6 6.65 -11.7 -1.9 0 0 0 0 6.35 0 1 0 rect2p.dat
  [1,16,16.6,6.65,-11.7,-1.9,0,0,0,0,6.35,0,1,0, ldraw_lib__rect2p()],
// 1 16 17.78 6.65 15.58 0 0.70433 -7.78035 6.35 0 0 0 -1 7.71965 rect3.dat
  [1,16,17.78,6.65,15.58,0,0.70433,-7.78035,6.35,0,0,0,-1,7.71965, ldraw_lib__rect3()],
// 1 16 5 6.65 23.3 -5 0 0 0 0 -6.35 0 -1 0 rect2p.dat
  [1,16,5,6.65,23.3,-5,0,0,0,0,-6.35,0,-1,0, ldraw_lib__rect2p()],
// 1 16 24.5 0.3 6.8 1.06066 0 1.06066 0 12.7 0 1.06066 0 -1.06066 1-4cylo.dat
  [1,16,24.5,0.3,6.8,1.06066,0,1.06066,0,12.7,0,1.06066,0,-1.06066, ldraw_lib__1_4cylo()],
// 5 24 19.5 0 0.408 20 0.3 0.2 20 0.3 -10.2 25.207 0 6.093
  [5,24,19.5,0,0.408,20,0.3,0.2,20,0.3,-10.2,25.207,0,6.093],
// 0 BFC INVERTNEXT
  [0,"BFC","INVERTNEXT"],
// 1 16 8.7 0 -4.5 0 0 0.5 0 0.3 0 0.5 0 0 1-4con9.dat
  [1,16,8.7,0,-4.5,0,0,0.5,0,0.3,0,0.5,0,0, ldraw_lib__1_4con9()],
// 1 16 8.7 0 -4.5 0 0 5 0 0.3 0 5 0 0 1-4edge.dat
  [1,16,8.7,0,-4.5,0,0,5,0,0.3,0,5,0,0, ldraw_lib__1_4edge()],
// 1 16 14.7 0.3 -10.2 0 0 -0.5 0 -0.3 0 -0.5 0 0 1-4con2.dat
  [1,16,14.7,0.3,-10.2,0,0,-0.5,0,-0.3,0,-0.5,0,0, ldraw_lib__1_4con2()],
// 1 16 14.7 0 -10.2 0 0 -1 0 0.3 0 -1 0 0 1-4edge.dat
  [1,16,14.7,0,-10.2,0,0,-1,0,0.3,0,-1,0,0, ldraw_lib__1_4edge()],
// 1 16 24.5 0 6.8 0.70711 0 0.70711 0 0.3 0 0.70711 0 -0.70711 1-4edge.dat
  [1,16,24.5,0,6.8,0.70711,0,0.70711,0,0.3,0,0.70711,0,-0.70711, ldraw_lib__1_4edge()],
// 1 16 24.5 0.3 6.8 0.35355 0 0.35355 0 -0.3 0 0.35355 0 -0.35355 1-4con2.dat
  [1,16,24.5,0.3,6.8,0.35355,0,0.35355,0,-0.3,0,0.35355,0,-0.35355, ldraw_lib__1_4con2()],
// 1 16 4.35 0.15 0.25 0 0 -4.35 -0.15 4.35 0 0.25 2.61 0 rect1.dat
  [1,16,4.35,0.15,0.25,0,0,-4.35,-0.15,4.35,0,0.25,2.61,0, ldraw_lib__rect1()],
// 1 16 13.45 0.15 -7.35 0.25 1.71 0 -0.15 2.85 0 0 0 2.85 rect1.dat
  [1,16,13.45,0.15,-7.35,0.25,1.71,0,-0.15,2.85,0,0,0,2.85, ldraw_lib__rect1()],
// 4 16 19.5 0 0.408 20 0.3 0.2 25.561 0.3 5.739 25.207 0 6.093
  [4,16,19.5,0,0.408,20,0.3,0.2,25.561,0.3,5.739,25.207,0,6.093],
// 4 16 25.207 0 7.507 25.56 0.3 7.86 10 0.3 23.3 9.794 0 22.8
  [4,16,25.207,0,7.507,25.56,0.3,7.86,10,0.3,23.3,9.794,0,22.8],
// 4 16 9.794 0 22.8 10 0.3 23.3 0 0.3 23.3 0 0 22.8
  [4,16,9.794,0,22.8,10,0.3,23.3,0,0.3,23.3,0,0,22.8],
// 4 16 0 0 22.8 0 0 0.5 8.7 0 0.5 9.794 0 22.8
  [4,16,0,0,22.8,0,0,0.5,8.7,0,0.5,9.794,0,22.8],
// 2 24 0 0 22.8 9.794 0 22.8
  [2,24,0,0,22.8,9.794,0,22.8],
// 2 24 9.794 0 22.8 25.207 0 7.507
  [2,24,9.794,0,22.8,25.207,0,7.507],
// 2 24 25.207 0 6.093 19.5 0 0.408
  [2,24,25.207,0,6.093,19.5,0,0.408],
// 5 24 9.794 0 22.8 10 0.3 23.3 25.56 0.3 7.86 0 0 22.8
  [5,24,9.794,0,22.8,10,0.3,23.3,25.56,0.3,7.86,0,0,22.8],
// 1 16 8.7 0 -4.5 0 0 5 0 0.3 0 5 0 0 1-4ndis.dat
  [1,16,8.7,0,-4.5,0,0,5,0,0.3,0,5,0,0, ldraw_lib__1_4ndis()],
// 1 16 14.7 0 -10.2 0 0 -1 0 0.3 0 -1 0 0 1-4chrd.dat
  [1,16,14.7,0,-10.2,0,0,-1,0,0.3,0,-1,0,0, ldraw_lib__1_4chrd()],
// 1 16 18.5 0 -10.2 1 0 0 0 0.3 0 0 0 -1 1-4edge.dat
  [1,16,18.5,0,-10.2,1,0,0,0,0.3,0,0,0,-1, ldraw_lib__1_4edge()],
// 1 16 18.5 0.3 -10.2 0.5 0 0 0 -0.3 0 0 0 -0.5 1-4con2.dat
  [1,16,18.5,0.3,-10.2,0.5,0,0,0,-0.3,0,0,0,-0.5, ldraw_lib__1_4con2()],
// 1 16 24.5 0 6.8 0.70711 0 0.70711 0 0.3 0 0.70711 0 -0.70711 1-4chrd.dat
  [1,16,24.5,0,6.8,0.70711,0,0.70711,0,0.3,0,0.70711,0,-0.70711, ldraw_lib__1_4chrd()],
// 1 16 16.6 0.15 -11.45 0 0 -1.9 -0.15 1.9 0 0.25 1.14 0 rect1.dat
  [1,16,16.6,0.15,-11.45,0,0,-1.9,-0.15,1.9,0,0.25,1.14,0, ldraw_lib__rect1()],
// 4 16 19.5 0 -10.2 20 0.3 -10.2 20 0.3 0.2 19.5 0 0.408
  [4,16,19.5,0,-10.2,20,0.3,-10.2,20,0.3,0.2,19.5,0,0.408],
// 4 16 18.5 0 -11.2 19.5 0 -10.2 13.7 0 -10.2 14.7 0 -11.2
  [4,16,18.5,0,-11.2,19.5,0,-10.2,13.7,0,-10.2,14.7,0,-11.2],
// 4 16 13.7 0 -4.5 13.7 0 -10.2 19.5 0 -10.2 19.5 0 0.408
  [4,16,13.7,0,-4.5,13.7,0,-10.2,19.5,0,-10.2,19.5,0,0.408],
// 4 16 9.794 0 22.8 8.7 0 0.5 13.7 0 0.5 25.207 0 7.507
  [4,16,9.794,0,22.8,8.7,0,0.5,13.7,0,0.5,25.207,0,7.507],
// 2 24 19.5 0 0.408 19.5 0 -10.2
  [2,24,19.5,0,0.408,19.5,0,-10.2],
// 1 16 18.5 0 -10.2 1 0 0 0 0.3 0 0 0 -1 1-4chrd.dat
  [1,16,18.5,0,-10.2,1,0,0,0,0.3,0,0,0,-1, ldraw_lib__1_4chrd()],
// 4 16 25.207 0 7.507 13.7 0 0.5 19.5 0 0.408 25.207 0 6.093
  [4,16,25.207,0,7.507,13.7,0,0.5,19.5,0,0.408,25.207,0,6.093],
// 3 16 19.5 0 0.408 13.7 0 0.5 13.7 0 -4.5
  [3,16,19.5,0,0.408,13.7,0,0.5,13.7,0,-4.5],
// 4 16 10 13 23.3 8.7 13 0 0 13 0 0 13 23.3
  [4,16,10,13,23.3,8.7,13,0,0,13,0,0,13,23.3],
// 4 16 25.561 13 7.861 13.2 13 0 8.7 13 0 10 13 23.3
  [4,16,25.561,13,7.861,13.2,13,0,8.7,13,0,10,13,23.3],
// 1 16 8.7 13 -4.5 0 0 4.5 0 -0.3 0 4.5 0 0 1-4ndis.dat
  [1,16,8.7,13,-4.5,0,0,4.5,0,-0.3,0,4.5,0,0, ldraw_lib__1_4ndis()],
// 1 16 14.7 13 -10.2 0 0 -1.5 0 -0.3 0 -1.5 0 0 1-4chrd.dat
  [1,16,14.7,13,-10.2,0,0,-1.5,0,-0.3,0,-1.5,0,0, ldraw_lib__1_4chrd()],
// 1 16 24.5 13 6.8 1.06066 0 1.06066 0 -0.3 0 1.06066 0 -1.06066 1-4chrd.dat
  [1,16,24.5,13,6.8,1.06066,0,1.06066,0,-0.3,0,1.06066,0,-1.06066, ldraw_lib__1_4chrd()],
// 1 16 18.5 13 -10.2 1.5 0 0 0 -0.3 0 0 0 -1.5 1-4chrd.dat
  [1,16,18.5,13,-10.2,1.5,0,0,0,-0.3,0,0,0,-1.5, ldraw_lib__1_4chrd()],
// 4 16 14.7 13 -11.7 13.2 13 -10.2 20 13 -10.2 18.5 13 -11.7
  [4,16,14.7,13,-11.7,13.2,13,-10.2,20,13,-10.2,18.5,13,-11.7],
// 4 16 20 13 0.2 20 13 -10.2 13.2 13 -10.2 13.2 13 -4.5
  [4,16,20,13,0.2,20,13,-10.2,13.2,13,-10.2,13.2,13,-4.5],
// 4 16 25.561 13 5.739 20 13 0.2 13.2 13 0 25.561 13 7.861
  [4,16,25.561,13,5.739,20,13,0.2,13.2,13,0,25.561,13,7.861],
// 3 16 13.2 13 -4.5 13.2 13 0 20 13 0.2
  [3,16,13.2,13,-4.5,13.2,13,0,20,13,0.2],
];
makepoly(ldraw_lib__99147(), line=0.2);
